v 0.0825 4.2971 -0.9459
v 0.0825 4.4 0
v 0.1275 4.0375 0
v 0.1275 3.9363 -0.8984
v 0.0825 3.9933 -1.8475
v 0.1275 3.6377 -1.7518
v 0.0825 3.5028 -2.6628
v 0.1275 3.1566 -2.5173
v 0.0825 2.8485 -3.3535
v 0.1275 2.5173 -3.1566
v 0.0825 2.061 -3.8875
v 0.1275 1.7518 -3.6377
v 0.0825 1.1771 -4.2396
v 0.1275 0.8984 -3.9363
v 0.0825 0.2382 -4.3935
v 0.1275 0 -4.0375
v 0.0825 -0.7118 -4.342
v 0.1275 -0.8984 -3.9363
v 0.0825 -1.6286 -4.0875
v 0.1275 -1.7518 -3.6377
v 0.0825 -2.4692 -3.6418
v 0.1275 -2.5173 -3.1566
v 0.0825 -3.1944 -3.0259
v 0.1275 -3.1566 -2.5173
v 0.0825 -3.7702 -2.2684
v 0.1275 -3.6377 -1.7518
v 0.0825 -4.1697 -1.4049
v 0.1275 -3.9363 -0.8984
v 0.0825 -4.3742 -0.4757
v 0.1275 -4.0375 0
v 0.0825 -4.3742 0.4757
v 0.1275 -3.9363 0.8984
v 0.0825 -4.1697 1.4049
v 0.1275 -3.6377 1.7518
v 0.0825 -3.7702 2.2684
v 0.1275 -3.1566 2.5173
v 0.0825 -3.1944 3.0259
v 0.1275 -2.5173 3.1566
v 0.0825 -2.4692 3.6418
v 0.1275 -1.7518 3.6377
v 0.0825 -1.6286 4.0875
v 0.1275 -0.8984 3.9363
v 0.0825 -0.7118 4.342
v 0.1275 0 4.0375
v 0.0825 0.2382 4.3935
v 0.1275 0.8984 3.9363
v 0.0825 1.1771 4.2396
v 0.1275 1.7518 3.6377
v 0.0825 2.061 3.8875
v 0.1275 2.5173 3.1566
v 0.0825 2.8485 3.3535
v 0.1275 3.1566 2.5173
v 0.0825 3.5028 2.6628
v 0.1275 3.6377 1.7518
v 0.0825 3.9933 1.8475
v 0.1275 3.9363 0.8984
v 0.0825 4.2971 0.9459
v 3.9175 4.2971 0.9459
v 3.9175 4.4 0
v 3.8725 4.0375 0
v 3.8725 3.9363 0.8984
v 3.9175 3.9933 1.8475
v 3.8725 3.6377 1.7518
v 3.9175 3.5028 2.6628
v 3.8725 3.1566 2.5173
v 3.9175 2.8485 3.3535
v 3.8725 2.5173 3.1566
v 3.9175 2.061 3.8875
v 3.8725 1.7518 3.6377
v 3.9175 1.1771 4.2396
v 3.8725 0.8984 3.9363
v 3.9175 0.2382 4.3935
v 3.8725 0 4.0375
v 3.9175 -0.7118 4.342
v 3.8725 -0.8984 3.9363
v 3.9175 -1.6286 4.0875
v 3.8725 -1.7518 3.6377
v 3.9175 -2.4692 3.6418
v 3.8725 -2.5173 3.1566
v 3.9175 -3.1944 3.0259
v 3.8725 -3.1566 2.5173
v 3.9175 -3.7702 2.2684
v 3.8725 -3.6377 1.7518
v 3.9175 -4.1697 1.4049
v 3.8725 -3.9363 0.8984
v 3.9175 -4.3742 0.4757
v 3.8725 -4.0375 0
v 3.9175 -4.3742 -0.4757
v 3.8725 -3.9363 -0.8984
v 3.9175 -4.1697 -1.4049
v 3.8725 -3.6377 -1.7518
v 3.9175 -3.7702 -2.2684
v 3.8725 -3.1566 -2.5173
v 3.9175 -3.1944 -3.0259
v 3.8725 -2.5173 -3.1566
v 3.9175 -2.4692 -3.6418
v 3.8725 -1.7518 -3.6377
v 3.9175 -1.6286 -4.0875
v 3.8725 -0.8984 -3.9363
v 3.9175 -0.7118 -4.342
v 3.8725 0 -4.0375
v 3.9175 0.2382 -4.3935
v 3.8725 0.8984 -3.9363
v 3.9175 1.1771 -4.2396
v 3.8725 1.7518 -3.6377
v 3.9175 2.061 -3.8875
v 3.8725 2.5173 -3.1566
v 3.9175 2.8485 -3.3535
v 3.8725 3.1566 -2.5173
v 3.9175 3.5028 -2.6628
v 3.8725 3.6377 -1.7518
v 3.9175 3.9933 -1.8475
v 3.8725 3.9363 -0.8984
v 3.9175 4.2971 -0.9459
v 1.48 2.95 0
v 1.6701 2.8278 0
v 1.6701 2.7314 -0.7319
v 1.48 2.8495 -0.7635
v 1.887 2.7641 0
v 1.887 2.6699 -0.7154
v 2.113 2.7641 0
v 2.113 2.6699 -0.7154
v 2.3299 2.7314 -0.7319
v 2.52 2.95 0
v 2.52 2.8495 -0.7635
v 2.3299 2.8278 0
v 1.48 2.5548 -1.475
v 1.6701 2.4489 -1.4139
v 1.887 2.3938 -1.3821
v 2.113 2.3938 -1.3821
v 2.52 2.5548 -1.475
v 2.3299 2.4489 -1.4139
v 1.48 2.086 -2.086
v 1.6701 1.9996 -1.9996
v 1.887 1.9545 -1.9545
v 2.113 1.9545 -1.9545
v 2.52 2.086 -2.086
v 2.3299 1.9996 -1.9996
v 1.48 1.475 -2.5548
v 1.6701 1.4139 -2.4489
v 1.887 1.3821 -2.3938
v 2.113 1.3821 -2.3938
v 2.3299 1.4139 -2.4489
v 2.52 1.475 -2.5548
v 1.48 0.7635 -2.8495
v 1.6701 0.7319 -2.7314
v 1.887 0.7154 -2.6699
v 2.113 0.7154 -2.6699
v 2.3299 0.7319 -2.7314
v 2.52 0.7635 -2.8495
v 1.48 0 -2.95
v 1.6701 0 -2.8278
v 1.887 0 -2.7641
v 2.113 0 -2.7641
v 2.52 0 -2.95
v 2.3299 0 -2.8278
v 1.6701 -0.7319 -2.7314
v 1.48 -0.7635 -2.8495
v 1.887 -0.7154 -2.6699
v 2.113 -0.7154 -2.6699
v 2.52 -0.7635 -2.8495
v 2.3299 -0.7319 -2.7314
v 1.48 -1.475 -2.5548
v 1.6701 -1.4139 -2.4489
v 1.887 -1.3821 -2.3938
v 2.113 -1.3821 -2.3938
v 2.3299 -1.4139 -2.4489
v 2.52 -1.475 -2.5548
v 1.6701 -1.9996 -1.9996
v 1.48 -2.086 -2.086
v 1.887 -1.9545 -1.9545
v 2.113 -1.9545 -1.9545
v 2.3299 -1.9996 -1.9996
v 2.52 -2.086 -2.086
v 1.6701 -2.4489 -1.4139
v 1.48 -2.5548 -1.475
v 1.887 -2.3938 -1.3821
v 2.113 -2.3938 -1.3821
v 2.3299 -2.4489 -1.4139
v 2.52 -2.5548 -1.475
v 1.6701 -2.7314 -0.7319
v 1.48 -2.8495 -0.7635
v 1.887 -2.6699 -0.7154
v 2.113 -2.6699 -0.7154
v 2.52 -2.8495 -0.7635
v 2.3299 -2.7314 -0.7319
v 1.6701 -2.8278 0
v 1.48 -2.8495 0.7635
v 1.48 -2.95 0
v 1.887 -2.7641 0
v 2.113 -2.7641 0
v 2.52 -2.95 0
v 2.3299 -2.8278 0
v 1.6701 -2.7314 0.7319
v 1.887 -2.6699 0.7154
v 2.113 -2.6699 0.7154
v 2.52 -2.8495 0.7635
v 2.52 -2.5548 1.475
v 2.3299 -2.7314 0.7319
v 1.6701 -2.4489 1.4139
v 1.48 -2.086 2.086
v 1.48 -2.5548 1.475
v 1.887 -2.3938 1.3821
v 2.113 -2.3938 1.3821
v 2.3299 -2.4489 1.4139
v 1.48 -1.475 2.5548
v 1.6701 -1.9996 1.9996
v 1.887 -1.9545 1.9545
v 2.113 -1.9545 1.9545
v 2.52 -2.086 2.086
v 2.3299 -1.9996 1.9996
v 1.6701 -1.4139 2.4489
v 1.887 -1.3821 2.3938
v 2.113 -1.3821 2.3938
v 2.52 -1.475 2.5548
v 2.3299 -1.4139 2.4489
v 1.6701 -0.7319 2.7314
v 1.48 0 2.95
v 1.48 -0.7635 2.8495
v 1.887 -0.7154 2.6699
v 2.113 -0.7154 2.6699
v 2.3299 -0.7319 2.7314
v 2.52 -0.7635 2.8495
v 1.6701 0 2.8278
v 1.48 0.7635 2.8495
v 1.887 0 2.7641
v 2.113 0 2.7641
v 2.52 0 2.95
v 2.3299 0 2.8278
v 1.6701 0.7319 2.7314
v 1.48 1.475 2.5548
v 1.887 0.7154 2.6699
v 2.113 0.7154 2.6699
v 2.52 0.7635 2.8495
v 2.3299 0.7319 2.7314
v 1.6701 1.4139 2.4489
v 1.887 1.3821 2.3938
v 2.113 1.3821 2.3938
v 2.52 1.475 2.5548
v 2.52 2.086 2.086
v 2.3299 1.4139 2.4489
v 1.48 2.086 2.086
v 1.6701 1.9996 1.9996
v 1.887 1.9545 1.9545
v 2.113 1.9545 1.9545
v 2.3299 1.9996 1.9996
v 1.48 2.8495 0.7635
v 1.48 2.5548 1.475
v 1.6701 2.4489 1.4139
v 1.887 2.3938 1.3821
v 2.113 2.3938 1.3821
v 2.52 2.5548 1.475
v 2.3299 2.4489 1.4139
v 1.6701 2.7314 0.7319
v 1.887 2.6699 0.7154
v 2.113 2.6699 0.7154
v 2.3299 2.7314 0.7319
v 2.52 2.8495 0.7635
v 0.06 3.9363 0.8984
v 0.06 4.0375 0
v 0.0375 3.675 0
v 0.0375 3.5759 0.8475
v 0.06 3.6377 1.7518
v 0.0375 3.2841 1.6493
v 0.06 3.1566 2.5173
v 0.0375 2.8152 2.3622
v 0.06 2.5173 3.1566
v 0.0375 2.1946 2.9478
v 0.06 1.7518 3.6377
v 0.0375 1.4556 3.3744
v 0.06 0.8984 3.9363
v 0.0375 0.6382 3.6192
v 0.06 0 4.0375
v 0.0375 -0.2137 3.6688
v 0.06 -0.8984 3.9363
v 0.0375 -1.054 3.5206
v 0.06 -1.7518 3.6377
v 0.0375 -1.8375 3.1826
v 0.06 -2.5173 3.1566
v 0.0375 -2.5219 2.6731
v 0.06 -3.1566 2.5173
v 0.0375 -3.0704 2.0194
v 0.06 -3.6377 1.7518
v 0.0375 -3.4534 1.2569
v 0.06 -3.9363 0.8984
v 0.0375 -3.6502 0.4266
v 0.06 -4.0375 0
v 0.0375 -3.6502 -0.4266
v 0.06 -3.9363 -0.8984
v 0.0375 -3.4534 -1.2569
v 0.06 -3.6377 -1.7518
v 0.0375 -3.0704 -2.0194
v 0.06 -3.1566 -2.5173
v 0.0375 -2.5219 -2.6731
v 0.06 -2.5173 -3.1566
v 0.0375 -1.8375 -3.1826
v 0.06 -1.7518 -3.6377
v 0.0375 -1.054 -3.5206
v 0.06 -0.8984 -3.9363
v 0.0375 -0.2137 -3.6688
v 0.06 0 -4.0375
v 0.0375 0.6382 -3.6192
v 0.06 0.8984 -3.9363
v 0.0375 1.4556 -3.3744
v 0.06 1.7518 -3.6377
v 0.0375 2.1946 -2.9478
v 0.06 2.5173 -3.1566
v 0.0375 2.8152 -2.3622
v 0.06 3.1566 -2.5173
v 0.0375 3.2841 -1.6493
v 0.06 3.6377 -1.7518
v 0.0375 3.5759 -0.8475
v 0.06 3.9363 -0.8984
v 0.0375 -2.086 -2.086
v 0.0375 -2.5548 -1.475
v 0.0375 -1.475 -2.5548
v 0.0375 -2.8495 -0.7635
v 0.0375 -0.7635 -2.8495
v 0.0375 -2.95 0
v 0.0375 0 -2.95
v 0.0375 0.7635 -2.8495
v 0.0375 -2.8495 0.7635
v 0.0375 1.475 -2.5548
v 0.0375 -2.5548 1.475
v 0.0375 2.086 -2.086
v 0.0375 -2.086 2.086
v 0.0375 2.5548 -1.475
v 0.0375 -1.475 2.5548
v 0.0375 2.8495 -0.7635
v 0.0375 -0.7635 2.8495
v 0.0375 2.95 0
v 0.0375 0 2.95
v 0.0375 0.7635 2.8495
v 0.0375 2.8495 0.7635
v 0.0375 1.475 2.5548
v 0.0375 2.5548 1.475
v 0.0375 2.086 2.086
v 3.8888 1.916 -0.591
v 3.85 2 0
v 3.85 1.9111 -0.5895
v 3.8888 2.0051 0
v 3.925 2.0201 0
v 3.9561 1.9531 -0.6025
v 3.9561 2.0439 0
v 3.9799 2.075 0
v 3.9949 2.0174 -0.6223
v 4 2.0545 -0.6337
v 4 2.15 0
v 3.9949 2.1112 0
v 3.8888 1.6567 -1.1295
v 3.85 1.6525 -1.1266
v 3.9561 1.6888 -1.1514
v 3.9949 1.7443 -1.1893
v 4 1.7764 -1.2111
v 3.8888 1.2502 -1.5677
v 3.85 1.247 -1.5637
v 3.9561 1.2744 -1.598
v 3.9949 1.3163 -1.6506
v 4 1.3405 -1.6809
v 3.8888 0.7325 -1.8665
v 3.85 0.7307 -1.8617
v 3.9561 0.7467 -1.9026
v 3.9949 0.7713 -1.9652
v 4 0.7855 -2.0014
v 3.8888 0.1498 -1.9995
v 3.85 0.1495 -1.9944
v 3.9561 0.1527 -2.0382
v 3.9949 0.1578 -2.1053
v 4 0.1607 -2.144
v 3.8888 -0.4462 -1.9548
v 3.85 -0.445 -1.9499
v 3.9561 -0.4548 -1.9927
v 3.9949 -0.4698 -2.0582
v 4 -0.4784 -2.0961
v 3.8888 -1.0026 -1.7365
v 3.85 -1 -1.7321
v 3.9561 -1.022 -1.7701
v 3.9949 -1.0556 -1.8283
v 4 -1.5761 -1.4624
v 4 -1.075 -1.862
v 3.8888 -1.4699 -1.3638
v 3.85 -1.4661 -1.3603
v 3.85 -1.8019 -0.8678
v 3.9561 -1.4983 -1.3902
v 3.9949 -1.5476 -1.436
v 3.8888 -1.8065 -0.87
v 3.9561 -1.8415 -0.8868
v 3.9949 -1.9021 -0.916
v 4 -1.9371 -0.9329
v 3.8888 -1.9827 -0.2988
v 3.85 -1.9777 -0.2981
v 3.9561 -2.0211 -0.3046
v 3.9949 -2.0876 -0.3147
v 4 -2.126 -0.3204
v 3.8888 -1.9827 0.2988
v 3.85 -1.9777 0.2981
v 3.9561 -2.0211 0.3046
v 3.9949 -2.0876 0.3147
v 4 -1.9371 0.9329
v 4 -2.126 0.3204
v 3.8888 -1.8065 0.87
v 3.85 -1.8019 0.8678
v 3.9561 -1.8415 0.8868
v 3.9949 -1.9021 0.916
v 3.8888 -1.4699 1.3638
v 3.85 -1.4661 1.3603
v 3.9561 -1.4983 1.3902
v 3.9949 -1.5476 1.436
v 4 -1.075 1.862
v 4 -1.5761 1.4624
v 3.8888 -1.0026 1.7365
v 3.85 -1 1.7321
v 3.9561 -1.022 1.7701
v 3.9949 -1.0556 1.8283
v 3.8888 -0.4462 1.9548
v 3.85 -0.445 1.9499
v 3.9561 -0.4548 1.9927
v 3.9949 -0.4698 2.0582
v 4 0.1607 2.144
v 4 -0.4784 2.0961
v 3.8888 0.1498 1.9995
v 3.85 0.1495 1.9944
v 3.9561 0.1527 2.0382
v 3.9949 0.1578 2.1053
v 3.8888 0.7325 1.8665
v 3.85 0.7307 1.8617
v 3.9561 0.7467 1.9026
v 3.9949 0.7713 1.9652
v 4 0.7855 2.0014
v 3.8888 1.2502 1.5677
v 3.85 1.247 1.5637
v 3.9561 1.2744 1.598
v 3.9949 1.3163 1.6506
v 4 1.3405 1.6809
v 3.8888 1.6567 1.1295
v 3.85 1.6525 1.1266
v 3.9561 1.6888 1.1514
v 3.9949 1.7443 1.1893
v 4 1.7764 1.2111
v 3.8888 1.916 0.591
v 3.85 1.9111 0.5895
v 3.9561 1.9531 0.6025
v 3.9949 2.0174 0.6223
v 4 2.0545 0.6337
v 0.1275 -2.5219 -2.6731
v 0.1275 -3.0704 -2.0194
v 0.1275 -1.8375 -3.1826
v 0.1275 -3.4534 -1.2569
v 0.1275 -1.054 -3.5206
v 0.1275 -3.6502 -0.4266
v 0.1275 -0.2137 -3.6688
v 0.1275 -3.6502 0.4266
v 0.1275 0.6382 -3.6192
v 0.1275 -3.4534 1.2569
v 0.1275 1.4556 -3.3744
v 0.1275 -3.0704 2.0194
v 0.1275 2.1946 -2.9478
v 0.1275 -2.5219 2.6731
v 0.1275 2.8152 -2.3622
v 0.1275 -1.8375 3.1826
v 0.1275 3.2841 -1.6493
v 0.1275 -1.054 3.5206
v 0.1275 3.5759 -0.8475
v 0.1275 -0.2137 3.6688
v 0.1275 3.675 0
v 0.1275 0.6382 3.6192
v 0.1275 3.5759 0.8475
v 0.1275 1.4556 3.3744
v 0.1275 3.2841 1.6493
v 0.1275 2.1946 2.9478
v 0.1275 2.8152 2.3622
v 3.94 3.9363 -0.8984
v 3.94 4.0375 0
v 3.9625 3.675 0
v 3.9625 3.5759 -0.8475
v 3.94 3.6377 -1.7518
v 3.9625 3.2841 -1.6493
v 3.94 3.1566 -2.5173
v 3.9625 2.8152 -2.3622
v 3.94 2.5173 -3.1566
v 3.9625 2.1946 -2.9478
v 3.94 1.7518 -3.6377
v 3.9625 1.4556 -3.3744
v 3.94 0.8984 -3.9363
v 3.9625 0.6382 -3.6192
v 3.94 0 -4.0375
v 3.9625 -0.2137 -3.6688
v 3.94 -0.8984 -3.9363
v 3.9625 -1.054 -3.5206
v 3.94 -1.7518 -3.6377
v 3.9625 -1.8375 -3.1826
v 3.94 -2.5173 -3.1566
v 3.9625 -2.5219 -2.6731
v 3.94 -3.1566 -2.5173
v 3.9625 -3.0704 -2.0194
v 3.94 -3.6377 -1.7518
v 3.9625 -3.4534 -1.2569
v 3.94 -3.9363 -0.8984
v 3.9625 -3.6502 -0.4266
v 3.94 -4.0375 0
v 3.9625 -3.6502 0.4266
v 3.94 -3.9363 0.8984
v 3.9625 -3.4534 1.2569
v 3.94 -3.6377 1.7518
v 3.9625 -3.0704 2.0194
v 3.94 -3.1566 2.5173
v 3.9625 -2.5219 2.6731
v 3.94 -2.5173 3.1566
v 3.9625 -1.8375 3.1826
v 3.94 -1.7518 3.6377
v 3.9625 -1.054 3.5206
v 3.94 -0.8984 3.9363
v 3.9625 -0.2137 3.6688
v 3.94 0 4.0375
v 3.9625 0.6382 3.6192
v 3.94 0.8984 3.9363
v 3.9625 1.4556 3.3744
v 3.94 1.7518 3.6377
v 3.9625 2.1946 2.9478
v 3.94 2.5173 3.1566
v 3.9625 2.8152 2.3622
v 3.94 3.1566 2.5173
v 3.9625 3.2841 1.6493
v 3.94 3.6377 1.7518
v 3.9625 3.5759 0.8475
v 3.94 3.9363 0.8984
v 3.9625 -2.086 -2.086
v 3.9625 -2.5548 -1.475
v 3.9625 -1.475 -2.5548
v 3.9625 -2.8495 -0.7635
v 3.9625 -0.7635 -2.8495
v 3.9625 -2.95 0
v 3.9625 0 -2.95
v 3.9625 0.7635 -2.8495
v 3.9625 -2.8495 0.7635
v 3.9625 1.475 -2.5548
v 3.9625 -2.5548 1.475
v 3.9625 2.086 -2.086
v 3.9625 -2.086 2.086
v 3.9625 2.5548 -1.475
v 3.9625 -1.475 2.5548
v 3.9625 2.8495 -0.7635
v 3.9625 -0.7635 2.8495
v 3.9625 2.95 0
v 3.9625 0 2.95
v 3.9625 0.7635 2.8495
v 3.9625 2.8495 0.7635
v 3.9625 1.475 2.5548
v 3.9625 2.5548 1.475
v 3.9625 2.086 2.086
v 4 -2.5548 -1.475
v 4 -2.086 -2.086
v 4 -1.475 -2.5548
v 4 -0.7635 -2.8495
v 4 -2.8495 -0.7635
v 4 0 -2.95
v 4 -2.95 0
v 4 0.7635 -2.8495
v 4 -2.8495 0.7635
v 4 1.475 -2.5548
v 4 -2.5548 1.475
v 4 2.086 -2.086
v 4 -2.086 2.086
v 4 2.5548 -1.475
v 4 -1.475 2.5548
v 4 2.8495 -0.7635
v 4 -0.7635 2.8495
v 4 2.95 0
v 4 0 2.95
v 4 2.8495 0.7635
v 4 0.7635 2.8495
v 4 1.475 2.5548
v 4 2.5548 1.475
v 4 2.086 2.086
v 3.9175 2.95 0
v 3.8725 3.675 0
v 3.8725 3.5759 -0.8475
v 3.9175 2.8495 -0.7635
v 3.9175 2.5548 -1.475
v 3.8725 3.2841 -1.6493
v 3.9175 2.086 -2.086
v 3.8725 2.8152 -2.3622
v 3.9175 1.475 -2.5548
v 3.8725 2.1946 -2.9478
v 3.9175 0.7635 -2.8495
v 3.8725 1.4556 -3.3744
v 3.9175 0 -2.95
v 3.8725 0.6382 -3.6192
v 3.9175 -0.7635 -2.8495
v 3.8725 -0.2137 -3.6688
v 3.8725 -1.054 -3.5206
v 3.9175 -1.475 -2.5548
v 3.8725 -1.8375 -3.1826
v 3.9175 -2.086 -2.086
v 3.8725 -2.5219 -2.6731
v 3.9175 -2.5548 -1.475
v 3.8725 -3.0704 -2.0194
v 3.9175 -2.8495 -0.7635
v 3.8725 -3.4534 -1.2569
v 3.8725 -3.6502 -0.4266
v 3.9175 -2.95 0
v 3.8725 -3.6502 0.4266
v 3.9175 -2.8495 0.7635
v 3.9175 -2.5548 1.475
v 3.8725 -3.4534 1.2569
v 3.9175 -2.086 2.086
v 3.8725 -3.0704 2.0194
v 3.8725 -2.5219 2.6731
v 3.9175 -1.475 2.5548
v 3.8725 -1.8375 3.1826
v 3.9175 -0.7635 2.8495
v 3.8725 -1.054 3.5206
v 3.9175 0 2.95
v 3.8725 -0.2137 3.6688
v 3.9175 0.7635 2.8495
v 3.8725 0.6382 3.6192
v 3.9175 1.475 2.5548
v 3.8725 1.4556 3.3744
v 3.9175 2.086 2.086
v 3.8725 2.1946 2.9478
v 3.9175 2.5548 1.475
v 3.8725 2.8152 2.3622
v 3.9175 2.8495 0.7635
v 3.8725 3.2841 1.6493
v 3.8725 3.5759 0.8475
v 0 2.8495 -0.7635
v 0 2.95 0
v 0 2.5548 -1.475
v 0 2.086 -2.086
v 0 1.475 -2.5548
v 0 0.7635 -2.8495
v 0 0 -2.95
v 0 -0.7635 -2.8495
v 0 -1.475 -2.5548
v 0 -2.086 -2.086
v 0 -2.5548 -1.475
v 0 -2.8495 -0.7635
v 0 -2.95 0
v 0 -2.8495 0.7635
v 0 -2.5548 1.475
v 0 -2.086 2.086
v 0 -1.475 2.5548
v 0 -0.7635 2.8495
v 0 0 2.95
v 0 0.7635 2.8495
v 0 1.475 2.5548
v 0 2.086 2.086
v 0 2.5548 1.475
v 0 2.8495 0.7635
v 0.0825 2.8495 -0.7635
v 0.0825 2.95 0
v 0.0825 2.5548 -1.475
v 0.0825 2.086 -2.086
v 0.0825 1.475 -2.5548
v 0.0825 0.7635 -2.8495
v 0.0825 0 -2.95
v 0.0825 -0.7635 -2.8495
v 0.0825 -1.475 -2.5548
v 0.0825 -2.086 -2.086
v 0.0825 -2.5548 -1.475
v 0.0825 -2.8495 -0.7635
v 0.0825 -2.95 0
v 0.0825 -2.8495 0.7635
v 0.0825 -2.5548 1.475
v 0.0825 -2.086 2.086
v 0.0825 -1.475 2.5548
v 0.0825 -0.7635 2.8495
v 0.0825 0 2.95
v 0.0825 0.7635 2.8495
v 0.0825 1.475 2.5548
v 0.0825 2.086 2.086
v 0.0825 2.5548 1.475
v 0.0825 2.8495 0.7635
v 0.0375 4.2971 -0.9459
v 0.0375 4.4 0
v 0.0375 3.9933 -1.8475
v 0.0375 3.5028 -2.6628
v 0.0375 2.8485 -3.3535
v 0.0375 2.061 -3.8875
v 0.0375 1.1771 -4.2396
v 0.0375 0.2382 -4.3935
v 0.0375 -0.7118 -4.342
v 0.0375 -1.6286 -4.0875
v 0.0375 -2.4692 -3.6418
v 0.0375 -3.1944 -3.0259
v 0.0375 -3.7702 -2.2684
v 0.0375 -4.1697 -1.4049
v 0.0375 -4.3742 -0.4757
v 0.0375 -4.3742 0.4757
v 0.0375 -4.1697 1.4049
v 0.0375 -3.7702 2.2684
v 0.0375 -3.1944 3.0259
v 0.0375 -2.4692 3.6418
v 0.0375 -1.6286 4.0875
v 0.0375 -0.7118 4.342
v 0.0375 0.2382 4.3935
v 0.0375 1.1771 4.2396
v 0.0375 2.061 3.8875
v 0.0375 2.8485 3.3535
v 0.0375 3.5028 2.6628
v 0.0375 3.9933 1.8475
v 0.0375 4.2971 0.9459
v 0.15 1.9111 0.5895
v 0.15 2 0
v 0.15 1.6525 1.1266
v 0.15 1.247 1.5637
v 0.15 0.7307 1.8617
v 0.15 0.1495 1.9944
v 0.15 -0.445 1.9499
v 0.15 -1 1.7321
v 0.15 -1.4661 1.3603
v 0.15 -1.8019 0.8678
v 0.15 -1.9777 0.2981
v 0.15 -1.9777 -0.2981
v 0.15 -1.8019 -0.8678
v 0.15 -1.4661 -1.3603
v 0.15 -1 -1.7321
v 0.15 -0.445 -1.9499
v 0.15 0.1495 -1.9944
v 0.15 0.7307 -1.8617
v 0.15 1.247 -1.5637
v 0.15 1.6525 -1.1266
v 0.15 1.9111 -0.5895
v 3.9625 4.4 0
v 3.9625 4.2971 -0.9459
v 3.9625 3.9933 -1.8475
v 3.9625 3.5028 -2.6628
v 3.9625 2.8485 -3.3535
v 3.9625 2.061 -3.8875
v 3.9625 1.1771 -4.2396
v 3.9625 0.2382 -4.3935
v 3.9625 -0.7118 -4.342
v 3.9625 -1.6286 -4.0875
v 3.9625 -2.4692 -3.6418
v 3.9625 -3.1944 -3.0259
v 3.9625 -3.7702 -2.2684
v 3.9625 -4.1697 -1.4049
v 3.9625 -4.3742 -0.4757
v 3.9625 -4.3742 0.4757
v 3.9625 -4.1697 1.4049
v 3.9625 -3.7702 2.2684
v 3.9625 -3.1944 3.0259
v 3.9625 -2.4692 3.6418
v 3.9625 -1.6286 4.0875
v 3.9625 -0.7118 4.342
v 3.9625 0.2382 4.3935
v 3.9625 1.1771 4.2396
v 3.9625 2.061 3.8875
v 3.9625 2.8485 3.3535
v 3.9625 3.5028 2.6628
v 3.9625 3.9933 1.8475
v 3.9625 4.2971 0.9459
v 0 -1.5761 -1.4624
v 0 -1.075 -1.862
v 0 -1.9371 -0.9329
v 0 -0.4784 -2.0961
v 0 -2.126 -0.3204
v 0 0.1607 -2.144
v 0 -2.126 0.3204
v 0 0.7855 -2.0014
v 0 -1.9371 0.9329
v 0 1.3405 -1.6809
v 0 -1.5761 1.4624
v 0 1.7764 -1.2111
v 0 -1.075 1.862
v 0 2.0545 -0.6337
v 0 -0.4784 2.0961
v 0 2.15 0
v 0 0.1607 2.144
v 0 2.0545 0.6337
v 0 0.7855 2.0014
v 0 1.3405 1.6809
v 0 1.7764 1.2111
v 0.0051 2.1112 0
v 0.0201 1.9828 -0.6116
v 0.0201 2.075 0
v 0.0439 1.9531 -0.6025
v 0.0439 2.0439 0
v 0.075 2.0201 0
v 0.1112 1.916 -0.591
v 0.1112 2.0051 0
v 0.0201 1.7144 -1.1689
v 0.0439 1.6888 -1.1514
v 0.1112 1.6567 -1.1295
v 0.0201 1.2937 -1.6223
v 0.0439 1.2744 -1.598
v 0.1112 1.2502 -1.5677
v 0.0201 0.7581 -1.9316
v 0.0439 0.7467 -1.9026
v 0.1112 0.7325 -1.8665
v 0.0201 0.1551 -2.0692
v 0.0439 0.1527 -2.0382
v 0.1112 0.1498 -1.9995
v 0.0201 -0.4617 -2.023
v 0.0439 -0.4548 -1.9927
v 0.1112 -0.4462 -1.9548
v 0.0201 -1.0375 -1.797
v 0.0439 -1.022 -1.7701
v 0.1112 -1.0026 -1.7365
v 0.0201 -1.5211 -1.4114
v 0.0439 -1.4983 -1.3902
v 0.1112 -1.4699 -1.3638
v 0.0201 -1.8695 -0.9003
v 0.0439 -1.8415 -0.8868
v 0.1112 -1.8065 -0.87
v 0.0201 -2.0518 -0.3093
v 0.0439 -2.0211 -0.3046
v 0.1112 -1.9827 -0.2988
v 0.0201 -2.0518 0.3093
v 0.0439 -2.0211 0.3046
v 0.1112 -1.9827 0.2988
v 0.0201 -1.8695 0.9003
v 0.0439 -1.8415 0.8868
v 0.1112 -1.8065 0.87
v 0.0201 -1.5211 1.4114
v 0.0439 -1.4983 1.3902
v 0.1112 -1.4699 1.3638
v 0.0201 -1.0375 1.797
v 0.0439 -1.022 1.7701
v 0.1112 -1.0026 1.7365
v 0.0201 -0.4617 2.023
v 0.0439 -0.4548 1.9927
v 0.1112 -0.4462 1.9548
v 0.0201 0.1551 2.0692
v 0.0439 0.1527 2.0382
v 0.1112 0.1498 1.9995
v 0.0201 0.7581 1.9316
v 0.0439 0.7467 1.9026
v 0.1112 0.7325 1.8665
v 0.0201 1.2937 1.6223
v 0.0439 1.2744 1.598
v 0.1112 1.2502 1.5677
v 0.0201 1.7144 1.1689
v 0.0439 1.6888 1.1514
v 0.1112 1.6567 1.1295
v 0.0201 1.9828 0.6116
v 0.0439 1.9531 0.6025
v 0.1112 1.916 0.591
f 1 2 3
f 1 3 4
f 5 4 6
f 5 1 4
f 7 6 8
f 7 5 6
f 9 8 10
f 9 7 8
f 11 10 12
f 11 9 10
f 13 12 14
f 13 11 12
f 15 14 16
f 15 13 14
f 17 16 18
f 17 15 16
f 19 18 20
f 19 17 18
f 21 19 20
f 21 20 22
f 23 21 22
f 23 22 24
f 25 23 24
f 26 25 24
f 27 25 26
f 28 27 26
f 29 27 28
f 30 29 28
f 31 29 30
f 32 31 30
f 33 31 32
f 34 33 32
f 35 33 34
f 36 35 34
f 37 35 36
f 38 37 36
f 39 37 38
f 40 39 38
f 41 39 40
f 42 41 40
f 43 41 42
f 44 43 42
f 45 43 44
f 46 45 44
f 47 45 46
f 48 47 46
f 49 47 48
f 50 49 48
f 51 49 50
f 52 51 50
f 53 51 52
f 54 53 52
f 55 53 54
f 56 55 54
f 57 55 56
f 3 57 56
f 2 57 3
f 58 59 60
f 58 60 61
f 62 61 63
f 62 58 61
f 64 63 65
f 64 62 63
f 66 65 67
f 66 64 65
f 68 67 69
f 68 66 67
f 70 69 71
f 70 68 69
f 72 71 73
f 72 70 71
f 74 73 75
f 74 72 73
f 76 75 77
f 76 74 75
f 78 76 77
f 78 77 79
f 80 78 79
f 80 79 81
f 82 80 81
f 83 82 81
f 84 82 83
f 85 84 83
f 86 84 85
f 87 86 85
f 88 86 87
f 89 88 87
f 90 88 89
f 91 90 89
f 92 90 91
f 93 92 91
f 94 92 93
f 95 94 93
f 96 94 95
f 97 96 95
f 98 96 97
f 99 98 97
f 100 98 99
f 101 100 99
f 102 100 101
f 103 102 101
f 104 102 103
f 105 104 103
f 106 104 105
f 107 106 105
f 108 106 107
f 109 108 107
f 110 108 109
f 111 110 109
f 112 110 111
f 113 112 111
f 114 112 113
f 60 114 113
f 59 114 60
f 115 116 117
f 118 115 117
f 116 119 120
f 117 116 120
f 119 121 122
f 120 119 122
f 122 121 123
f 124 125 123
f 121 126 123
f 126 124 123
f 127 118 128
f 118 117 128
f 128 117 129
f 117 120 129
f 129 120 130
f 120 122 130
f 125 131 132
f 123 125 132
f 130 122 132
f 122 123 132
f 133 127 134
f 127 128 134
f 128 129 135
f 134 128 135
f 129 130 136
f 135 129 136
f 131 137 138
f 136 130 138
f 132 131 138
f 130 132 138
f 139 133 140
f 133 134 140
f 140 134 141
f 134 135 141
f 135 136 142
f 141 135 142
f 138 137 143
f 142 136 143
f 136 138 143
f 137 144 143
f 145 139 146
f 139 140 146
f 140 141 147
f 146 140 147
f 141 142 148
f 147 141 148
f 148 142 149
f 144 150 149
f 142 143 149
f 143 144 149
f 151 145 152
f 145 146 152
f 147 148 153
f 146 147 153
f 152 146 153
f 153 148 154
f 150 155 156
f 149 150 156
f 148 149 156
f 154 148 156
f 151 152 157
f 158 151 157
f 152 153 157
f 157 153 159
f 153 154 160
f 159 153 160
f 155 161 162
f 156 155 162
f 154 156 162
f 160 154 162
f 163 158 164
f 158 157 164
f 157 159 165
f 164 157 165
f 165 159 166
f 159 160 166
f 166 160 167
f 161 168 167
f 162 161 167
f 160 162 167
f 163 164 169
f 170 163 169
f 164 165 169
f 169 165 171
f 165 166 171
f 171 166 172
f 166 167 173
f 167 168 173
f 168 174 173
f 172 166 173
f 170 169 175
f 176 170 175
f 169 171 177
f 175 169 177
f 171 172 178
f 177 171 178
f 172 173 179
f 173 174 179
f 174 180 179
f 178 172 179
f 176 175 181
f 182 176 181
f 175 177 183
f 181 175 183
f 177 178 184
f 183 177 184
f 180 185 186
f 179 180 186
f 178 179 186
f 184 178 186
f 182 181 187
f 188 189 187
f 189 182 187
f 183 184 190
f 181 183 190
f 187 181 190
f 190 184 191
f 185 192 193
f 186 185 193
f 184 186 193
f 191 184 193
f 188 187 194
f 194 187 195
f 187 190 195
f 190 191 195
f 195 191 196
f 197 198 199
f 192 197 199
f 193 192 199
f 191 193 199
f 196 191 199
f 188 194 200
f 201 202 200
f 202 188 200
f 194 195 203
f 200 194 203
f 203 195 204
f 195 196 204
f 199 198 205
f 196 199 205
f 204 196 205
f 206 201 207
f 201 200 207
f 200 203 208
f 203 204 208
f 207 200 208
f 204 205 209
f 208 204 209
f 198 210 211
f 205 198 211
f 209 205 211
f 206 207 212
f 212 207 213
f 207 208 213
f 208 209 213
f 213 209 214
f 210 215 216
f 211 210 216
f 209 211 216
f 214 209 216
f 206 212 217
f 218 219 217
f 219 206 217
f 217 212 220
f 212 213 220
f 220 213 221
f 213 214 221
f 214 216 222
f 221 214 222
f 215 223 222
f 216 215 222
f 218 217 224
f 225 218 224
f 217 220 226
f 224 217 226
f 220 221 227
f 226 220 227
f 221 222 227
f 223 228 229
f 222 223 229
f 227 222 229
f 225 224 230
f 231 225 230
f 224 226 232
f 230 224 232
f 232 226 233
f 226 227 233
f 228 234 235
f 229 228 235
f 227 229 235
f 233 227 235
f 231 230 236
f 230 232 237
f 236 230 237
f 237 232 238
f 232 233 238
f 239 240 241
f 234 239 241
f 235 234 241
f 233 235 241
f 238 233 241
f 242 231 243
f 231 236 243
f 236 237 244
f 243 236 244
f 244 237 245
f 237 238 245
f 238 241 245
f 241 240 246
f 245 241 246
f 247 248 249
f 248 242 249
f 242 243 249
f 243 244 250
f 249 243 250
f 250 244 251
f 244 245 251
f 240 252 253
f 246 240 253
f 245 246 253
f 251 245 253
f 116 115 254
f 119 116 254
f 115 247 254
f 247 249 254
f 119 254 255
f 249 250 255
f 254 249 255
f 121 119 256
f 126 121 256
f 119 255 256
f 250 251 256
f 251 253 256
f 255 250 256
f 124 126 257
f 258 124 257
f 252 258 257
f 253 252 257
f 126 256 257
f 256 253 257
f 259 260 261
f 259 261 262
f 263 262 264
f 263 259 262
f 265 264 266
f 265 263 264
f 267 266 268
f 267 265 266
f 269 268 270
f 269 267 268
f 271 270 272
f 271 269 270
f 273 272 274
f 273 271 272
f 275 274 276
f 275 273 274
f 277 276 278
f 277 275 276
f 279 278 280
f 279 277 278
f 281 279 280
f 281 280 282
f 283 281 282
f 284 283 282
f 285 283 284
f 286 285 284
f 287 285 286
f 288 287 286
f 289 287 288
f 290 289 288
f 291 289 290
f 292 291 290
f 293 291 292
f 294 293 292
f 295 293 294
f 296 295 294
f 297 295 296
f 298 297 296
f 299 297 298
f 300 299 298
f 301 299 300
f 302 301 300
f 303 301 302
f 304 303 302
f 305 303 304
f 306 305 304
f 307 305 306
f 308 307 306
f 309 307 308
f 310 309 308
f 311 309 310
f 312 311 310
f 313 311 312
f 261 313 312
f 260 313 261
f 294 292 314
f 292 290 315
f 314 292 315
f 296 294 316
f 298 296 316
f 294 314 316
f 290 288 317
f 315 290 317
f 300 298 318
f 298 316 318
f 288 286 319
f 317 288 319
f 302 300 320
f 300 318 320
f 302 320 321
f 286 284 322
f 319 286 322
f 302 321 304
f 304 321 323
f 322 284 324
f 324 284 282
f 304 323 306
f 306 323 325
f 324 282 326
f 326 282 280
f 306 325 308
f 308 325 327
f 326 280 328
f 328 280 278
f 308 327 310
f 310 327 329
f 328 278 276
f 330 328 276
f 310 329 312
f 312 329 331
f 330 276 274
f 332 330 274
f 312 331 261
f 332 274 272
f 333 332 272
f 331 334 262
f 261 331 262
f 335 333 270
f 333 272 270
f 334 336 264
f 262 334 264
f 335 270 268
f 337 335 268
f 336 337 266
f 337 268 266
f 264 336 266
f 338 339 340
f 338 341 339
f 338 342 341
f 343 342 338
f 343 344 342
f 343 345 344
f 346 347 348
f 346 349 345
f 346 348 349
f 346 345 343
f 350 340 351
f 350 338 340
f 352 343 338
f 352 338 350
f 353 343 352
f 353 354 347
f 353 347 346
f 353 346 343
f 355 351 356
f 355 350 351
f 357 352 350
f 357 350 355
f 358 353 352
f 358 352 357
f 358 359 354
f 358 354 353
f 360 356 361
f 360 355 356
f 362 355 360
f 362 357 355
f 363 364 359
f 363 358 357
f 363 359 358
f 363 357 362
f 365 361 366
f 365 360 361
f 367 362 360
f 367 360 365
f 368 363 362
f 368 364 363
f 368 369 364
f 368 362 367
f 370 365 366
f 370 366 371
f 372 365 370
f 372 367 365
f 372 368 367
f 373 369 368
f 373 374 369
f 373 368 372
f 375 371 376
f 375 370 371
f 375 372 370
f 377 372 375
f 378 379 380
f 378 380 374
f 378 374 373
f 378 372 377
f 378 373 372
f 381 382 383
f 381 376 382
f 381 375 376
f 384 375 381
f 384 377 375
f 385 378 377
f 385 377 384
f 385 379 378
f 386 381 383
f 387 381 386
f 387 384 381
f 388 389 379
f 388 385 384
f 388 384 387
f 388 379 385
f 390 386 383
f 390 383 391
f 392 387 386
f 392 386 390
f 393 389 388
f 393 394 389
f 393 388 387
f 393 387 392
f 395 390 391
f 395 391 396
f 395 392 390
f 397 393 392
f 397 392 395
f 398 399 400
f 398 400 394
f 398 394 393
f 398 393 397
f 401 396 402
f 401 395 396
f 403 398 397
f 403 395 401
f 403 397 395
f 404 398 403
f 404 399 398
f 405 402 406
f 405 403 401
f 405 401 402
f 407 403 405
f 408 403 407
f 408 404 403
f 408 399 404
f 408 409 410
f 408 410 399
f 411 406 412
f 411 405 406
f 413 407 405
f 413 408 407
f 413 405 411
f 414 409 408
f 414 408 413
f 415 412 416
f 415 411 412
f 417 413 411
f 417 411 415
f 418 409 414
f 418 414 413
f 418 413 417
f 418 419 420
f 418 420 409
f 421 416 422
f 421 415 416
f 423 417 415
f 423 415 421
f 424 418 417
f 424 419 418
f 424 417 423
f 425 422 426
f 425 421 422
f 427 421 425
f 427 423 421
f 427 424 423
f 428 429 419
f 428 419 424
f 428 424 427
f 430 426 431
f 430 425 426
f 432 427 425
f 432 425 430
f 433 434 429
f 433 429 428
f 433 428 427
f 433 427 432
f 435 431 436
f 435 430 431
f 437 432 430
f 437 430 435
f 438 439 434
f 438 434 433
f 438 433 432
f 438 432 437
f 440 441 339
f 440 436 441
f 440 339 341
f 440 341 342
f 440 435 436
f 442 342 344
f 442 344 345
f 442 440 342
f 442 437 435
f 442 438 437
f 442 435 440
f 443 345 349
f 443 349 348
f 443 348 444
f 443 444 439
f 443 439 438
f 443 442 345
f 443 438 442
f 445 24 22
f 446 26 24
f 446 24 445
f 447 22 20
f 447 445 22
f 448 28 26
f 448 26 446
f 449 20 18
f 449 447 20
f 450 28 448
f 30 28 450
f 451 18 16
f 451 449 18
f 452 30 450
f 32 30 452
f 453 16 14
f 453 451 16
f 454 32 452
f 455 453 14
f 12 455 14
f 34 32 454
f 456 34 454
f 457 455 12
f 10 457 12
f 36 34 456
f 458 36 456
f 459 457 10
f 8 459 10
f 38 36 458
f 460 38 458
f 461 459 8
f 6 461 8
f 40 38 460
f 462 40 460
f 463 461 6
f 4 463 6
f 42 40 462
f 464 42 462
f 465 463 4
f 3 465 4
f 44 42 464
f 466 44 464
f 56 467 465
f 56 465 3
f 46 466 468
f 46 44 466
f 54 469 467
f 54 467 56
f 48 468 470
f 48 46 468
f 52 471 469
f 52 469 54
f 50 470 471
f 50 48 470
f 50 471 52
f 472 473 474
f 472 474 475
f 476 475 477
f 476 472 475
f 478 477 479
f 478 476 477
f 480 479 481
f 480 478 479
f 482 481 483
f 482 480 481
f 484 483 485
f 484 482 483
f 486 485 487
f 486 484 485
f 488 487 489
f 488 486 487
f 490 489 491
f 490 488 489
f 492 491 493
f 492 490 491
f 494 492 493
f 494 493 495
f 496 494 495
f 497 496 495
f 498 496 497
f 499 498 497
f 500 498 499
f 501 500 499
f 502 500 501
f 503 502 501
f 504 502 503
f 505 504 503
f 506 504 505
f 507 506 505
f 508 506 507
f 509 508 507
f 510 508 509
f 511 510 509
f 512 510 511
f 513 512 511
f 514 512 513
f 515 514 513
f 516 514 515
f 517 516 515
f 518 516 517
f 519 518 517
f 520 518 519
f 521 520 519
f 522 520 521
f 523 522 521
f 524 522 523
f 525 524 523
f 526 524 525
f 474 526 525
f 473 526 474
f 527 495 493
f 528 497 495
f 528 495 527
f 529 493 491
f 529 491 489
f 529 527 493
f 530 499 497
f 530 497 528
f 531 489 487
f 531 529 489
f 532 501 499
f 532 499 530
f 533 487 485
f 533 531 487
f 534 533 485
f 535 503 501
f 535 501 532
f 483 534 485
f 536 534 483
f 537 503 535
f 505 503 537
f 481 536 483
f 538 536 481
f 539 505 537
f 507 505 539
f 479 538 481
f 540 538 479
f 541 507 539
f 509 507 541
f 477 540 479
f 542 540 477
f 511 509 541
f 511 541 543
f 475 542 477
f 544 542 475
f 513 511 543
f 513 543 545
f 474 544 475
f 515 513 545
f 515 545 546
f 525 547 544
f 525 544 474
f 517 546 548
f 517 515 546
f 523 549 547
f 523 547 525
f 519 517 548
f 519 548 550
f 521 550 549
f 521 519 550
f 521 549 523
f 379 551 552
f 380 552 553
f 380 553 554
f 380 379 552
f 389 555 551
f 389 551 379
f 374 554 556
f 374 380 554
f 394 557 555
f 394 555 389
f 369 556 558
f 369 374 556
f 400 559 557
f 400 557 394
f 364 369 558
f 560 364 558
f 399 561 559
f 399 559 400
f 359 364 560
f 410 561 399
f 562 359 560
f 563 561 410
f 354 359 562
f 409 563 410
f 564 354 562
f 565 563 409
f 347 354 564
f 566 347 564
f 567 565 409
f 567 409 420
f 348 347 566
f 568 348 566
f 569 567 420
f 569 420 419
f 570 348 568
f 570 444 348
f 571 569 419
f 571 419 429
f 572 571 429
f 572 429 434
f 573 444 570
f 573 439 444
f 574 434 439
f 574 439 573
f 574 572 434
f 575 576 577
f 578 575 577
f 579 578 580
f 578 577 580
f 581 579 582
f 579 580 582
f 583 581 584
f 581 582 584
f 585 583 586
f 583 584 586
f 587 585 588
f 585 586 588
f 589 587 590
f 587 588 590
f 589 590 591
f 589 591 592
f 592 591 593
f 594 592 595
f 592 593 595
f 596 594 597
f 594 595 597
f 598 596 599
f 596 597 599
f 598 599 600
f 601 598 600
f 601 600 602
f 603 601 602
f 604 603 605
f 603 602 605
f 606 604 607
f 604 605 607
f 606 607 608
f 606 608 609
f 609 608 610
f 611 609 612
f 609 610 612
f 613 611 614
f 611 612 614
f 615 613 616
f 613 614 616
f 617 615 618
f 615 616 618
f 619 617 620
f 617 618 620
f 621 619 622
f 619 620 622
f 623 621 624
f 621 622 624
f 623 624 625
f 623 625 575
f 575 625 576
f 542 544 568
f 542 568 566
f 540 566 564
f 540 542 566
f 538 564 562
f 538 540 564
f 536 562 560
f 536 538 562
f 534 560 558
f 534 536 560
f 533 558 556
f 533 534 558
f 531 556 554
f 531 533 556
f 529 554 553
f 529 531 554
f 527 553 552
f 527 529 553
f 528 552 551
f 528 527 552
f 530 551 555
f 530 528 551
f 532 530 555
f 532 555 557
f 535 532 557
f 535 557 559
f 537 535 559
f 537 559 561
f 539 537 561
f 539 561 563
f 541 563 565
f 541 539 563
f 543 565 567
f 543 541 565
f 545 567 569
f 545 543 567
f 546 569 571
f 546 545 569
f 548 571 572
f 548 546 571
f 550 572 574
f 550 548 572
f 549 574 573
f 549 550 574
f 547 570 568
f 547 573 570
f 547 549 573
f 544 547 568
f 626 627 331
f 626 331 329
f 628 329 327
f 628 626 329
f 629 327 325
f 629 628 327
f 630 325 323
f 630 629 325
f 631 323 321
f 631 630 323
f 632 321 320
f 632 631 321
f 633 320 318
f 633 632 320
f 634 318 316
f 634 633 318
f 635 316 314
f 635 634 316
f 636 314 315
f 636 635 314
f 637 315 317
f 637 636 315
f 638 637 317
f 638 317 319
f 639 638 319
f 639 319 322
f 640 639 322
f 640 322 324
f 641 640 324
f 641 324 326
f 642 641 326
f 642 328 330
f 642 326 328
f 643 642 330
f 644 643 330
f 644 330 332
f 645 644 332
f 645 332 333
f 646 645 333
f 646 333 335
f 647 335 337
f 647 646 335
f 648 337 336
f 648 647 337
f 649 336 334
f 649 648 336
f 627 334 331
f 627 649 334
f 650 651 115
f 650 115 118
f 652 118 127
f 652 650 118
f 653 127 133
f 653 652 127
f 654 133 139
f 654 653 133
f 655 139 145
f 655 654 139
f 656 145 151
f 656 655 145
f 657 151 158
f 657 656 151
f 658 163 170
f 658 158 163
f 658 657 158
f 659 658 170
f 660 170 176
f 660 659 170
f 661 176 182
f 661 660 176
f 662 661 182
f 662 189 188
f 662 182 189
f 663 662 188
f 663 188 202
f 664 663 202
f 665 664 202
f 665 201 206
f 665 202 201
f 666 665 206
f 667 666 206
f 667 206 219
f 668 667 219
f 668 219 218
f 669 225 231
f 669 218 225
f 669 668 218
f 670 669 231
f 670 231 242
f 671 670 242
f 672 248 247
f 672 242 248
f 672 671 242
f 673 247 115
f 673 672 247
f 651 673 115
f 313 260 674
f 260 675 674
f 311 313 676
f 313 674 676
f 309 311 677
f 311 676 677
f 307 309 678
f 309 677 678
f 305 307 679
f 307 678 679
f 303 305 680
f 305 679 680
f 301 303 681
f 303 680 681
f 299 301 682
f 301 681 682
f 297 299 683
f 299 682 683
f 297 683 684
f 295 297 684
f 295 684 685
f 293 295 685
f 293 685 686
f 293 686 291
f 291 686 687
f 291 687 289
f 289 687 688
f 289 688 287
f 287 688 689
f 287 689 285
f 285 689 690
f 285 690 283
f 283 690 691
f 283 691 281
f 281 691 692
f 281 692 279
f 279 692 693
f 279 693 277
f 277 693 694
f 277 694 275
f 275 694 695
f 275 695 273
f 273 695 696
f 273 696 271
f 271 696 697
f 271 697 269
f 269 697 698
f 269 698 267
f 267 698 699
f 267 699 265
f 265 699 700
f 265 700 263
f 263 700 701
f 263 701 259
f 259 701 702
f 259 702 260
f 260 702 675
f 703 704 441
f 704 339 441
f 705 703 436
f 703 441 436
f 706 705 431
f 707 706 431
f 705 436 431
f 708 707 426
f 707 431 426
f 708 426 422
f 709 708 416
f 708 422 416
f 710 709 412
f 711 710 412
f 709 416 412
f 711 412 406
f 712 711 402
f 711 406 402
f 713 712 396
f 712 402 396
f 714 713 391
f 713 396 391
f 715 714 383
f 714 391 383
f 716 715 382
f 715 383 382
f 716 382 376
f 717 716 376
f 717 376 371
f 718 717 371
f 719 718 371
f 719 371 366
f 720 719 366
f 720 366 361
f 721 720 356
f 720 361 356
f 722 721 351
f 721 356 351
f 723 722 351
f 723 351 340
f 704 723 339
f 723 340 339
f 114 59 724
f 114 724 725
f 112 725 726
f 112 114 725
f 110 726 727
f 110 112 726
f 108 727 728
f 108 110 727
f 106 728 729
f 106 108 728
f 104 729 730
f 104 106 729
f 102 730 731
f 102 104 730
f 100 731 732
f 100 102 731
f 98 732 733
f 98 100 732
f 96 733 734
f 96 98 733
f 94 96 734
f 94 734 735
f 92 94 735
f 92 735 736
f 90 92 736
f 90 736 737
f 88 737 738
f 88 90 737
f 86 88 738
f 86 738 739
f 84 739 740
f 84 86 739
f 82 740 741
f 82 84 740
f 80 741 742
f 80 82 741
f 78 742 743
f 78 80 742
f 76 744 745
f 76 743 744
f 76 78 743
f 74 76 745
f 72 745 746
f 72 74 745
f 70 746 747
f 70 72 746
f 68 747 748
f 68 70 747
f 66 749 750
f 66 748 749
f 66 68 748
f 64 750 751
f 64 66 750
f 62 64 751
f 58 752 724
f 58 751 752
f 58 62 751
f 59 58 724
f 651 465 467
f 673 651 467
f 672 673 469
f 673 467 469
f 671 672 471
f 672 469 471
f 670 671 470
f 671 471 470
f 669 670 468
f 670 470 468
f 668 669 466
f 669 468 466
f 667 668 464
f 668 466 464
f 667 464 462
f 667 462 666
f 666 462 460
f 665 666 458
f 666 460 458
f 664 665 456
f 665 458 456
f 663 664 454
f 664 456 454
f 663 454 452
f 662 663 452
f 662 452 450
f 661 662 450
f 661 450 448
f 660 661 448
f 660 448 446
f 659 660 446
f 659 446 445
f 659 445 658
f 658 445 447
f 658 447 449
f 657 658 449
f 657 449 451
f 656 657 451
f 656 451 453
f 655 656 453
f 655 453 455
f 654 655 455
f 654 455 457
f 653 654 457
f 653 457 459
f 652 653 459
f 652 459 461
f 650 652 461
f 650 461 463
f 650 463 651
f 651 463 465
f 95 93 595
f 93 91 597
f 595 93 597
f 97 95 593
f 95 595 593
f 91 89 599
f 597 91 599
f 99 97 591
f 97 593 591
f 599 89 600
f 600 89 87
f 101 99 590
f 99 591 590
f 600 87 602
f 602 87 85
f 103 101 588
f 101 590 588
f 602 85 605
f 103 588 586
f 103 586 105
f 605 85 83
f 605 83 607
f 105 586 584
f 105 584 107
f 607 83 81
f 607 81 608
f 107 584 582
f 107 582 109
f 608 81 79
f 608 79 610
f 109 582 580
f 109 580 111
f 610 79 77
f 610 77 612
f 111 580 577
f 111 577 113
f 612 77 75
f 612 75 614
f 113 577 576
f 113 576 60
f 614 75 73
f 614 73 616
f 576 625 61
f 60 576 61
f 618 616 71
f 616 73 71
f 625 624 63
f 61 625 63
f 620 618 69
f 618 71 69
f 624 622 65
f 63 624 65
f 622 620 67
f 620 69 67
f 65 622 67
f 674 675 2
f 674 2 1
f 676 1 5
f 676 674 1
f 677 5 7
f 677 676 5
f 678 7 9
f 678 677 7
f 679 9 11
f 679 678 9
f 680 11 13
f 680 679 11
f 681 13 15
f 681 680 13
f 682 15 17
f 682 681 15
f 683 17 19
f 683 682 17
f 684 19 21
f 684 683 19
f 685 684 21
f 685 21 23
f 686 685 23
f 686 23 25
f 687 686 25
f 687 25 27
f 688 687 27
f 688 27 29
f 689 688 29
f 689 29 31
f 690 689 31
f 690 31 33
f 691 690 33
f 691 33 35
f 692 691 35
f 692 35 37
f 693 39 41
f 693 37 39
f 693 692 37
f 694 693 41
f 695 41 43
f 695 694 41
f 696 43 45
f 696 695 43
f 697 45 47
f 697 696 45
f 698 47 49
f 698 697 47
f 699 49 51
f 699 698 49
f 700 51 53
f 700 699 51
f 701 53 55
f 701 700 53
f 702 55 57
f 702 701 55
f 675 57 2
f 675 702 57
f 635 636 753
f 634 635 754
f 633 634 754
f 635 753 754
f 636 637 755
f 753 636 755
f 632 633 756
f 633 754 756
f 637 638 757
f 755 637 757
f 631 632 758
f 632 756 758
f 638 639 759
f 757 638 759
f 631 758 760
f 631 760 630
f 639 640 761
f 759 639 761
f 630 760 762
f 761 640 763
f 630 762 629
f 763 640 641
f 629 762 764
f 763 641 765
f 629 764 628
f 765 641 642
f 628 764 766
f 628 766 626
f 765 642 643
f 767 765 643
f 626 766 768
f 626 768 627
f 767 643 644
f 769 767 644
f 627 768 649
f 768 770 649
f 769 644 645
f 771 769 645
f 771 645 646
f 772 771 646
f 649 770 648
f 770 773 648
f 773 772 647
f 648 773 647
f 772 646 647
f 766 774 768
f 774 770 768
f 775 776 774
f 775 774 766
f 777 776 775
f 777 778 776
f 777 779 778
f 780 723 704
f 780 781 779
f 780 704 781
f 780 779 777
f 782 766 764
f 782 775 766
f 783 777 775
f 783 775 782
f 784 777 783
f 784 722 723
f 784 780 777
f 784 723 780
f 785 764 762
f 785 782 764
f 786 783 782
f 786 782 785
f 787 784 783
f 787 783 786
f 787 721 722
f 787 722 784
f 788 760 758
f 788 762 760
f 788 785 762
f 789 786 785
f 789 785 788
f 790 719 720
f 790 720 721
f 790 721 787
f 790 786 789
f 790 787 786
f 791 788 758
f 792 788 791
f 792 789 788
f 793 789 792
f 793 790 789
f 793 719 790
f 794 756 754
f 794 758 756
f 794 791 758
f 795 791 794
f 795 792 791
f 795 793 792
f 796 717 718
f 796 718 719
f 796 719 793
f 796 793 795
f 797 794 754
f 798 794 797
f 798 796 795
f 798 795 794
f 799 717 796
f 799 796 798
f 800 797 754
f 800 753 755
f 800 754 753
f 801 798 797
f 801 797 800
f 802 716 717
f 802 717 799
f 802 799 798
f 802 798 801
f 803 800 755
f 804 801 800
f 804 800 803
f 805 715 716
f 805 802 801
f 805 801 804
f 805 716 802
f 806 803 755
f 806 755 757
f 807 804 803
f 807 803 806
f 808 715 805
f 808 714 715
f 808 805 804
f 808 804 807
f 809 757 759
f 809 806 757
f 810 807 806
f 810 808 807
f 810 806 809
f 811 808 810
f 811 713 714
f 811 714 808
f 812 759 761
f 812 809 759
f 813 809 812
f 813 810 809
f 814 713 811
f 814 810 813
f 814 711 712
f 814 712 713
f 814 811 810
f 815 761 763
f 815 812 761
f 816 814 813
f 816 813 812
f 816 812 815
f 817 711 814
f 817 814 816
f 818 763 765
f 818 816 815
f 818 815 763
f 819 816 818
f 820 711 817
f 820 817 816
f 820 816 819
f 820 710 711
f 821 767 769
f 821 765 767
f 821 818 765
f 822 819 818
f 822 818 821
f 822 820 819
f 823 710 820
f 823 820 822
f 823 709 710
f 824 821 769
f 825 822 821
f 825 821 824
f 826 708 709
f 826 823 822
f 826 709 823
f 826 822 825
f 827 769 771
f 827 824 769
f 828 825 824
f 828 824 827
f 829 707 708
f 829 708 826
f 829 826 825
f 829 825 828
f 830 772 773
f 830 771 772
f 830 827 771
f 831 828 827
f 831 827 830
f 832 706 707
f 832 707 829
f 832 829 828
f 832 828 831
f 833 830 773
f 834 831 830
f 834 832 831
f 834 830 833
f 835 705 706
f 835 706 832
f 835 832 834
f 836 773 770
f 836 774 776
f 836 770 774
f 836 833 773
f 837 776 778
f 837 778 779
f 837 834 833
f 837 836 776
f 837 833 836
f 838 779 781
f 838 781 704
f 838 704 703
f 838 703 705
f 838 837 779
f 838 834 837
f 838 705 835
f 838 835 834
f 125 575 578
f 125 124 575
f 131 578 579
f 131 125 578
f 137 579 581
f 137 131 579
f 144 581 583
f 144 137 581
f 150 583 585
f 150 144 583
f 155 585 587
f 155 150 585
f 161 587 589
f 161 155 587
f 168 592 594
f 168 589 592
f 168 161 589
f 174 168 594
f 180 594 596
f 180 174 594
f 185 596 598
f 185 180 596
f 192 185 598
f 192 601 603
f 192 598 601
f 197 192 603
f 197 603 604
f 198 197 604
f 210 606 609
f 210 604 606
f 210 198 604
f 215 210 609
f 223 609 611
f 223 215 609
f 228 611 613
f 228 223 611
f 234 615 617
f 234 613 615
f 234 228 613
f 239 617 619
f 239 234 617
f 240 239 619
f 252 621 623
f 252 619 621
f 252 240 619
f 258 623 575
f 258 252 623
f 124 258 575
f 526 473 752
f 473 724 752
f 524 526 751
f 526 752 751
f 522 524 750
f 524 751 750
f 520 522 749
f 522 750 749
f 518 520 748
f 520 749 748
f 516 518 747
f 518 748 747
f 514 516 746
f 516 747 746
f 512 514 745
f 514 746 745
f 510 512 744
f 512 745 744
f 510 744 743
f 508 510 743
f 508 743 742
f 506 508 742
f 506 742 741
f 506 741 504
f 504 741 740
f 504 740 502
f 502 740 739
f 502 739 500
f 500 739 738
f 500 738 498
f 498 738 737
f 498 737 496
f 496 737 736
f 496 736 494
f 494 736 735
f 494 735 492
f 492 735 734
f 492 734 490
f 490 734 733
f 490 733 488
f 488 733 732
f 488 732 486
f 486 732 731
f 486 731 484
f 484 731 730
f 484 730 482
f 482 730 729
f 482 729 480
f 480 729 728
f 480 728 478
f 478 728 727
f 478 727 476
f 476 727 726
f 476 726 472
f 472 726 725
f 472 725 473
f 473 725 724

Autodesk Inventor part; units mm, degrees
ref_plane "YZ Plane" through (0, 0, 0) normal (1, 0, 0) x (0, 1, 0)
ref_plane "XZ Plane" through (0, 0, 0) normal (0, 1, 0) x (-1, 0, 0)
ref_plane "XY Plane" through (0, 0, 0) normal (0, 0, 1) x (1, 0, 0)
sketch "Sketch_13" plane through (0, 0, 0) normal (0, 0, 1) x (1, 0, 0)
  line L0 (2, 0) -> (-2, 0)
  arc A0 (0, 2.15) -> (0.15, 2) centre (0.15, 2.15) ccw
  line L1 (0.15, 2) -> (3.85, 2)
  arc A1 (3.85, 2) -> (4, 2.15) centre (3.85, 2.15) ccw
  line L2 (4, 2.15) -> (4, 2.95)
  line L3 (4, 2.95) -> (2.52, 2.95)
  arc A2 (1.48, 2.95) -> (2.52, 2.95) centre (2, 3.55) ccw
  line L4 (1.48, 2.95) -> (0, 2.95)
  line L5 (0, 2.95) -> (0, 2.15)
revolve "Revolution1" add sketch "Sketch_13" angle 360 about axis through (2, 0, 0) along (1, 0, 0)
sketch "Sketch_25" plane through (0, 0, 0) normal (0, 0, 1) x (1, 0, 0)
  line L0 (50, 0) -> (-50, 0)
  line L1 (0.0375, 4.4) -> (0.06, 4.0375)
  line L2 (0.06, 4.0375) -> (0.0375, 3.675)
  line L3 (0.0375, 3.675) -> (0.0375, 2.95)
  line L4 (0.0375, 2.95) -> (0.0825, 2.95)
  line L5 (0.0825, 2.95) -> (0.1275, 3.675)
  line L6 (0.1275, 3.675) -> (0.1275, 4.0375)
  line L7 (0.1275, 4.0375) -> (0.0825, 4.4)
  line L8 (0.0825, 4.4) -> (0.0375, 4.4)
revolve "Revolution2" add sketch "Sketch_25" angle 360 about axis through (50, 0, 0) along (1, 0, 0)
sketch "Sketch_26" plane through (0, 0, 0) normal (0, 0, 1) x (1, 0, 0)
  line L0 (50, 0) -> (-50, 0)
  line L1 (3.8725, 4.0375) -> (3.8725, 3.675)
  line L2 (3.8725, 3.675) -> (3.9175, 2.95)
  line L3 (3.9175, 2.95) -> (3.9625, 2.95)
  line L4 (3.9625, 2.95) -> (3.9625, 3.675)
  line L5 (3.9625, 3.675) -> (3.94, 4.0375)
  line L6 (3.94, 4.0375) -> (3.9625, 4.4)
  line L7 (3.9625, 4.4) -> (3.9175, 4.4)
  line L8 (3.9175, 4.4) -> (3.8725, 4.0375)
revolve "Revolution3" add sketch "Sketch_26" angle 360 about axis through (50, 0, 0) along (1, 0, 0)
properties part number "W 638/4 XR-2Z_PART1"
